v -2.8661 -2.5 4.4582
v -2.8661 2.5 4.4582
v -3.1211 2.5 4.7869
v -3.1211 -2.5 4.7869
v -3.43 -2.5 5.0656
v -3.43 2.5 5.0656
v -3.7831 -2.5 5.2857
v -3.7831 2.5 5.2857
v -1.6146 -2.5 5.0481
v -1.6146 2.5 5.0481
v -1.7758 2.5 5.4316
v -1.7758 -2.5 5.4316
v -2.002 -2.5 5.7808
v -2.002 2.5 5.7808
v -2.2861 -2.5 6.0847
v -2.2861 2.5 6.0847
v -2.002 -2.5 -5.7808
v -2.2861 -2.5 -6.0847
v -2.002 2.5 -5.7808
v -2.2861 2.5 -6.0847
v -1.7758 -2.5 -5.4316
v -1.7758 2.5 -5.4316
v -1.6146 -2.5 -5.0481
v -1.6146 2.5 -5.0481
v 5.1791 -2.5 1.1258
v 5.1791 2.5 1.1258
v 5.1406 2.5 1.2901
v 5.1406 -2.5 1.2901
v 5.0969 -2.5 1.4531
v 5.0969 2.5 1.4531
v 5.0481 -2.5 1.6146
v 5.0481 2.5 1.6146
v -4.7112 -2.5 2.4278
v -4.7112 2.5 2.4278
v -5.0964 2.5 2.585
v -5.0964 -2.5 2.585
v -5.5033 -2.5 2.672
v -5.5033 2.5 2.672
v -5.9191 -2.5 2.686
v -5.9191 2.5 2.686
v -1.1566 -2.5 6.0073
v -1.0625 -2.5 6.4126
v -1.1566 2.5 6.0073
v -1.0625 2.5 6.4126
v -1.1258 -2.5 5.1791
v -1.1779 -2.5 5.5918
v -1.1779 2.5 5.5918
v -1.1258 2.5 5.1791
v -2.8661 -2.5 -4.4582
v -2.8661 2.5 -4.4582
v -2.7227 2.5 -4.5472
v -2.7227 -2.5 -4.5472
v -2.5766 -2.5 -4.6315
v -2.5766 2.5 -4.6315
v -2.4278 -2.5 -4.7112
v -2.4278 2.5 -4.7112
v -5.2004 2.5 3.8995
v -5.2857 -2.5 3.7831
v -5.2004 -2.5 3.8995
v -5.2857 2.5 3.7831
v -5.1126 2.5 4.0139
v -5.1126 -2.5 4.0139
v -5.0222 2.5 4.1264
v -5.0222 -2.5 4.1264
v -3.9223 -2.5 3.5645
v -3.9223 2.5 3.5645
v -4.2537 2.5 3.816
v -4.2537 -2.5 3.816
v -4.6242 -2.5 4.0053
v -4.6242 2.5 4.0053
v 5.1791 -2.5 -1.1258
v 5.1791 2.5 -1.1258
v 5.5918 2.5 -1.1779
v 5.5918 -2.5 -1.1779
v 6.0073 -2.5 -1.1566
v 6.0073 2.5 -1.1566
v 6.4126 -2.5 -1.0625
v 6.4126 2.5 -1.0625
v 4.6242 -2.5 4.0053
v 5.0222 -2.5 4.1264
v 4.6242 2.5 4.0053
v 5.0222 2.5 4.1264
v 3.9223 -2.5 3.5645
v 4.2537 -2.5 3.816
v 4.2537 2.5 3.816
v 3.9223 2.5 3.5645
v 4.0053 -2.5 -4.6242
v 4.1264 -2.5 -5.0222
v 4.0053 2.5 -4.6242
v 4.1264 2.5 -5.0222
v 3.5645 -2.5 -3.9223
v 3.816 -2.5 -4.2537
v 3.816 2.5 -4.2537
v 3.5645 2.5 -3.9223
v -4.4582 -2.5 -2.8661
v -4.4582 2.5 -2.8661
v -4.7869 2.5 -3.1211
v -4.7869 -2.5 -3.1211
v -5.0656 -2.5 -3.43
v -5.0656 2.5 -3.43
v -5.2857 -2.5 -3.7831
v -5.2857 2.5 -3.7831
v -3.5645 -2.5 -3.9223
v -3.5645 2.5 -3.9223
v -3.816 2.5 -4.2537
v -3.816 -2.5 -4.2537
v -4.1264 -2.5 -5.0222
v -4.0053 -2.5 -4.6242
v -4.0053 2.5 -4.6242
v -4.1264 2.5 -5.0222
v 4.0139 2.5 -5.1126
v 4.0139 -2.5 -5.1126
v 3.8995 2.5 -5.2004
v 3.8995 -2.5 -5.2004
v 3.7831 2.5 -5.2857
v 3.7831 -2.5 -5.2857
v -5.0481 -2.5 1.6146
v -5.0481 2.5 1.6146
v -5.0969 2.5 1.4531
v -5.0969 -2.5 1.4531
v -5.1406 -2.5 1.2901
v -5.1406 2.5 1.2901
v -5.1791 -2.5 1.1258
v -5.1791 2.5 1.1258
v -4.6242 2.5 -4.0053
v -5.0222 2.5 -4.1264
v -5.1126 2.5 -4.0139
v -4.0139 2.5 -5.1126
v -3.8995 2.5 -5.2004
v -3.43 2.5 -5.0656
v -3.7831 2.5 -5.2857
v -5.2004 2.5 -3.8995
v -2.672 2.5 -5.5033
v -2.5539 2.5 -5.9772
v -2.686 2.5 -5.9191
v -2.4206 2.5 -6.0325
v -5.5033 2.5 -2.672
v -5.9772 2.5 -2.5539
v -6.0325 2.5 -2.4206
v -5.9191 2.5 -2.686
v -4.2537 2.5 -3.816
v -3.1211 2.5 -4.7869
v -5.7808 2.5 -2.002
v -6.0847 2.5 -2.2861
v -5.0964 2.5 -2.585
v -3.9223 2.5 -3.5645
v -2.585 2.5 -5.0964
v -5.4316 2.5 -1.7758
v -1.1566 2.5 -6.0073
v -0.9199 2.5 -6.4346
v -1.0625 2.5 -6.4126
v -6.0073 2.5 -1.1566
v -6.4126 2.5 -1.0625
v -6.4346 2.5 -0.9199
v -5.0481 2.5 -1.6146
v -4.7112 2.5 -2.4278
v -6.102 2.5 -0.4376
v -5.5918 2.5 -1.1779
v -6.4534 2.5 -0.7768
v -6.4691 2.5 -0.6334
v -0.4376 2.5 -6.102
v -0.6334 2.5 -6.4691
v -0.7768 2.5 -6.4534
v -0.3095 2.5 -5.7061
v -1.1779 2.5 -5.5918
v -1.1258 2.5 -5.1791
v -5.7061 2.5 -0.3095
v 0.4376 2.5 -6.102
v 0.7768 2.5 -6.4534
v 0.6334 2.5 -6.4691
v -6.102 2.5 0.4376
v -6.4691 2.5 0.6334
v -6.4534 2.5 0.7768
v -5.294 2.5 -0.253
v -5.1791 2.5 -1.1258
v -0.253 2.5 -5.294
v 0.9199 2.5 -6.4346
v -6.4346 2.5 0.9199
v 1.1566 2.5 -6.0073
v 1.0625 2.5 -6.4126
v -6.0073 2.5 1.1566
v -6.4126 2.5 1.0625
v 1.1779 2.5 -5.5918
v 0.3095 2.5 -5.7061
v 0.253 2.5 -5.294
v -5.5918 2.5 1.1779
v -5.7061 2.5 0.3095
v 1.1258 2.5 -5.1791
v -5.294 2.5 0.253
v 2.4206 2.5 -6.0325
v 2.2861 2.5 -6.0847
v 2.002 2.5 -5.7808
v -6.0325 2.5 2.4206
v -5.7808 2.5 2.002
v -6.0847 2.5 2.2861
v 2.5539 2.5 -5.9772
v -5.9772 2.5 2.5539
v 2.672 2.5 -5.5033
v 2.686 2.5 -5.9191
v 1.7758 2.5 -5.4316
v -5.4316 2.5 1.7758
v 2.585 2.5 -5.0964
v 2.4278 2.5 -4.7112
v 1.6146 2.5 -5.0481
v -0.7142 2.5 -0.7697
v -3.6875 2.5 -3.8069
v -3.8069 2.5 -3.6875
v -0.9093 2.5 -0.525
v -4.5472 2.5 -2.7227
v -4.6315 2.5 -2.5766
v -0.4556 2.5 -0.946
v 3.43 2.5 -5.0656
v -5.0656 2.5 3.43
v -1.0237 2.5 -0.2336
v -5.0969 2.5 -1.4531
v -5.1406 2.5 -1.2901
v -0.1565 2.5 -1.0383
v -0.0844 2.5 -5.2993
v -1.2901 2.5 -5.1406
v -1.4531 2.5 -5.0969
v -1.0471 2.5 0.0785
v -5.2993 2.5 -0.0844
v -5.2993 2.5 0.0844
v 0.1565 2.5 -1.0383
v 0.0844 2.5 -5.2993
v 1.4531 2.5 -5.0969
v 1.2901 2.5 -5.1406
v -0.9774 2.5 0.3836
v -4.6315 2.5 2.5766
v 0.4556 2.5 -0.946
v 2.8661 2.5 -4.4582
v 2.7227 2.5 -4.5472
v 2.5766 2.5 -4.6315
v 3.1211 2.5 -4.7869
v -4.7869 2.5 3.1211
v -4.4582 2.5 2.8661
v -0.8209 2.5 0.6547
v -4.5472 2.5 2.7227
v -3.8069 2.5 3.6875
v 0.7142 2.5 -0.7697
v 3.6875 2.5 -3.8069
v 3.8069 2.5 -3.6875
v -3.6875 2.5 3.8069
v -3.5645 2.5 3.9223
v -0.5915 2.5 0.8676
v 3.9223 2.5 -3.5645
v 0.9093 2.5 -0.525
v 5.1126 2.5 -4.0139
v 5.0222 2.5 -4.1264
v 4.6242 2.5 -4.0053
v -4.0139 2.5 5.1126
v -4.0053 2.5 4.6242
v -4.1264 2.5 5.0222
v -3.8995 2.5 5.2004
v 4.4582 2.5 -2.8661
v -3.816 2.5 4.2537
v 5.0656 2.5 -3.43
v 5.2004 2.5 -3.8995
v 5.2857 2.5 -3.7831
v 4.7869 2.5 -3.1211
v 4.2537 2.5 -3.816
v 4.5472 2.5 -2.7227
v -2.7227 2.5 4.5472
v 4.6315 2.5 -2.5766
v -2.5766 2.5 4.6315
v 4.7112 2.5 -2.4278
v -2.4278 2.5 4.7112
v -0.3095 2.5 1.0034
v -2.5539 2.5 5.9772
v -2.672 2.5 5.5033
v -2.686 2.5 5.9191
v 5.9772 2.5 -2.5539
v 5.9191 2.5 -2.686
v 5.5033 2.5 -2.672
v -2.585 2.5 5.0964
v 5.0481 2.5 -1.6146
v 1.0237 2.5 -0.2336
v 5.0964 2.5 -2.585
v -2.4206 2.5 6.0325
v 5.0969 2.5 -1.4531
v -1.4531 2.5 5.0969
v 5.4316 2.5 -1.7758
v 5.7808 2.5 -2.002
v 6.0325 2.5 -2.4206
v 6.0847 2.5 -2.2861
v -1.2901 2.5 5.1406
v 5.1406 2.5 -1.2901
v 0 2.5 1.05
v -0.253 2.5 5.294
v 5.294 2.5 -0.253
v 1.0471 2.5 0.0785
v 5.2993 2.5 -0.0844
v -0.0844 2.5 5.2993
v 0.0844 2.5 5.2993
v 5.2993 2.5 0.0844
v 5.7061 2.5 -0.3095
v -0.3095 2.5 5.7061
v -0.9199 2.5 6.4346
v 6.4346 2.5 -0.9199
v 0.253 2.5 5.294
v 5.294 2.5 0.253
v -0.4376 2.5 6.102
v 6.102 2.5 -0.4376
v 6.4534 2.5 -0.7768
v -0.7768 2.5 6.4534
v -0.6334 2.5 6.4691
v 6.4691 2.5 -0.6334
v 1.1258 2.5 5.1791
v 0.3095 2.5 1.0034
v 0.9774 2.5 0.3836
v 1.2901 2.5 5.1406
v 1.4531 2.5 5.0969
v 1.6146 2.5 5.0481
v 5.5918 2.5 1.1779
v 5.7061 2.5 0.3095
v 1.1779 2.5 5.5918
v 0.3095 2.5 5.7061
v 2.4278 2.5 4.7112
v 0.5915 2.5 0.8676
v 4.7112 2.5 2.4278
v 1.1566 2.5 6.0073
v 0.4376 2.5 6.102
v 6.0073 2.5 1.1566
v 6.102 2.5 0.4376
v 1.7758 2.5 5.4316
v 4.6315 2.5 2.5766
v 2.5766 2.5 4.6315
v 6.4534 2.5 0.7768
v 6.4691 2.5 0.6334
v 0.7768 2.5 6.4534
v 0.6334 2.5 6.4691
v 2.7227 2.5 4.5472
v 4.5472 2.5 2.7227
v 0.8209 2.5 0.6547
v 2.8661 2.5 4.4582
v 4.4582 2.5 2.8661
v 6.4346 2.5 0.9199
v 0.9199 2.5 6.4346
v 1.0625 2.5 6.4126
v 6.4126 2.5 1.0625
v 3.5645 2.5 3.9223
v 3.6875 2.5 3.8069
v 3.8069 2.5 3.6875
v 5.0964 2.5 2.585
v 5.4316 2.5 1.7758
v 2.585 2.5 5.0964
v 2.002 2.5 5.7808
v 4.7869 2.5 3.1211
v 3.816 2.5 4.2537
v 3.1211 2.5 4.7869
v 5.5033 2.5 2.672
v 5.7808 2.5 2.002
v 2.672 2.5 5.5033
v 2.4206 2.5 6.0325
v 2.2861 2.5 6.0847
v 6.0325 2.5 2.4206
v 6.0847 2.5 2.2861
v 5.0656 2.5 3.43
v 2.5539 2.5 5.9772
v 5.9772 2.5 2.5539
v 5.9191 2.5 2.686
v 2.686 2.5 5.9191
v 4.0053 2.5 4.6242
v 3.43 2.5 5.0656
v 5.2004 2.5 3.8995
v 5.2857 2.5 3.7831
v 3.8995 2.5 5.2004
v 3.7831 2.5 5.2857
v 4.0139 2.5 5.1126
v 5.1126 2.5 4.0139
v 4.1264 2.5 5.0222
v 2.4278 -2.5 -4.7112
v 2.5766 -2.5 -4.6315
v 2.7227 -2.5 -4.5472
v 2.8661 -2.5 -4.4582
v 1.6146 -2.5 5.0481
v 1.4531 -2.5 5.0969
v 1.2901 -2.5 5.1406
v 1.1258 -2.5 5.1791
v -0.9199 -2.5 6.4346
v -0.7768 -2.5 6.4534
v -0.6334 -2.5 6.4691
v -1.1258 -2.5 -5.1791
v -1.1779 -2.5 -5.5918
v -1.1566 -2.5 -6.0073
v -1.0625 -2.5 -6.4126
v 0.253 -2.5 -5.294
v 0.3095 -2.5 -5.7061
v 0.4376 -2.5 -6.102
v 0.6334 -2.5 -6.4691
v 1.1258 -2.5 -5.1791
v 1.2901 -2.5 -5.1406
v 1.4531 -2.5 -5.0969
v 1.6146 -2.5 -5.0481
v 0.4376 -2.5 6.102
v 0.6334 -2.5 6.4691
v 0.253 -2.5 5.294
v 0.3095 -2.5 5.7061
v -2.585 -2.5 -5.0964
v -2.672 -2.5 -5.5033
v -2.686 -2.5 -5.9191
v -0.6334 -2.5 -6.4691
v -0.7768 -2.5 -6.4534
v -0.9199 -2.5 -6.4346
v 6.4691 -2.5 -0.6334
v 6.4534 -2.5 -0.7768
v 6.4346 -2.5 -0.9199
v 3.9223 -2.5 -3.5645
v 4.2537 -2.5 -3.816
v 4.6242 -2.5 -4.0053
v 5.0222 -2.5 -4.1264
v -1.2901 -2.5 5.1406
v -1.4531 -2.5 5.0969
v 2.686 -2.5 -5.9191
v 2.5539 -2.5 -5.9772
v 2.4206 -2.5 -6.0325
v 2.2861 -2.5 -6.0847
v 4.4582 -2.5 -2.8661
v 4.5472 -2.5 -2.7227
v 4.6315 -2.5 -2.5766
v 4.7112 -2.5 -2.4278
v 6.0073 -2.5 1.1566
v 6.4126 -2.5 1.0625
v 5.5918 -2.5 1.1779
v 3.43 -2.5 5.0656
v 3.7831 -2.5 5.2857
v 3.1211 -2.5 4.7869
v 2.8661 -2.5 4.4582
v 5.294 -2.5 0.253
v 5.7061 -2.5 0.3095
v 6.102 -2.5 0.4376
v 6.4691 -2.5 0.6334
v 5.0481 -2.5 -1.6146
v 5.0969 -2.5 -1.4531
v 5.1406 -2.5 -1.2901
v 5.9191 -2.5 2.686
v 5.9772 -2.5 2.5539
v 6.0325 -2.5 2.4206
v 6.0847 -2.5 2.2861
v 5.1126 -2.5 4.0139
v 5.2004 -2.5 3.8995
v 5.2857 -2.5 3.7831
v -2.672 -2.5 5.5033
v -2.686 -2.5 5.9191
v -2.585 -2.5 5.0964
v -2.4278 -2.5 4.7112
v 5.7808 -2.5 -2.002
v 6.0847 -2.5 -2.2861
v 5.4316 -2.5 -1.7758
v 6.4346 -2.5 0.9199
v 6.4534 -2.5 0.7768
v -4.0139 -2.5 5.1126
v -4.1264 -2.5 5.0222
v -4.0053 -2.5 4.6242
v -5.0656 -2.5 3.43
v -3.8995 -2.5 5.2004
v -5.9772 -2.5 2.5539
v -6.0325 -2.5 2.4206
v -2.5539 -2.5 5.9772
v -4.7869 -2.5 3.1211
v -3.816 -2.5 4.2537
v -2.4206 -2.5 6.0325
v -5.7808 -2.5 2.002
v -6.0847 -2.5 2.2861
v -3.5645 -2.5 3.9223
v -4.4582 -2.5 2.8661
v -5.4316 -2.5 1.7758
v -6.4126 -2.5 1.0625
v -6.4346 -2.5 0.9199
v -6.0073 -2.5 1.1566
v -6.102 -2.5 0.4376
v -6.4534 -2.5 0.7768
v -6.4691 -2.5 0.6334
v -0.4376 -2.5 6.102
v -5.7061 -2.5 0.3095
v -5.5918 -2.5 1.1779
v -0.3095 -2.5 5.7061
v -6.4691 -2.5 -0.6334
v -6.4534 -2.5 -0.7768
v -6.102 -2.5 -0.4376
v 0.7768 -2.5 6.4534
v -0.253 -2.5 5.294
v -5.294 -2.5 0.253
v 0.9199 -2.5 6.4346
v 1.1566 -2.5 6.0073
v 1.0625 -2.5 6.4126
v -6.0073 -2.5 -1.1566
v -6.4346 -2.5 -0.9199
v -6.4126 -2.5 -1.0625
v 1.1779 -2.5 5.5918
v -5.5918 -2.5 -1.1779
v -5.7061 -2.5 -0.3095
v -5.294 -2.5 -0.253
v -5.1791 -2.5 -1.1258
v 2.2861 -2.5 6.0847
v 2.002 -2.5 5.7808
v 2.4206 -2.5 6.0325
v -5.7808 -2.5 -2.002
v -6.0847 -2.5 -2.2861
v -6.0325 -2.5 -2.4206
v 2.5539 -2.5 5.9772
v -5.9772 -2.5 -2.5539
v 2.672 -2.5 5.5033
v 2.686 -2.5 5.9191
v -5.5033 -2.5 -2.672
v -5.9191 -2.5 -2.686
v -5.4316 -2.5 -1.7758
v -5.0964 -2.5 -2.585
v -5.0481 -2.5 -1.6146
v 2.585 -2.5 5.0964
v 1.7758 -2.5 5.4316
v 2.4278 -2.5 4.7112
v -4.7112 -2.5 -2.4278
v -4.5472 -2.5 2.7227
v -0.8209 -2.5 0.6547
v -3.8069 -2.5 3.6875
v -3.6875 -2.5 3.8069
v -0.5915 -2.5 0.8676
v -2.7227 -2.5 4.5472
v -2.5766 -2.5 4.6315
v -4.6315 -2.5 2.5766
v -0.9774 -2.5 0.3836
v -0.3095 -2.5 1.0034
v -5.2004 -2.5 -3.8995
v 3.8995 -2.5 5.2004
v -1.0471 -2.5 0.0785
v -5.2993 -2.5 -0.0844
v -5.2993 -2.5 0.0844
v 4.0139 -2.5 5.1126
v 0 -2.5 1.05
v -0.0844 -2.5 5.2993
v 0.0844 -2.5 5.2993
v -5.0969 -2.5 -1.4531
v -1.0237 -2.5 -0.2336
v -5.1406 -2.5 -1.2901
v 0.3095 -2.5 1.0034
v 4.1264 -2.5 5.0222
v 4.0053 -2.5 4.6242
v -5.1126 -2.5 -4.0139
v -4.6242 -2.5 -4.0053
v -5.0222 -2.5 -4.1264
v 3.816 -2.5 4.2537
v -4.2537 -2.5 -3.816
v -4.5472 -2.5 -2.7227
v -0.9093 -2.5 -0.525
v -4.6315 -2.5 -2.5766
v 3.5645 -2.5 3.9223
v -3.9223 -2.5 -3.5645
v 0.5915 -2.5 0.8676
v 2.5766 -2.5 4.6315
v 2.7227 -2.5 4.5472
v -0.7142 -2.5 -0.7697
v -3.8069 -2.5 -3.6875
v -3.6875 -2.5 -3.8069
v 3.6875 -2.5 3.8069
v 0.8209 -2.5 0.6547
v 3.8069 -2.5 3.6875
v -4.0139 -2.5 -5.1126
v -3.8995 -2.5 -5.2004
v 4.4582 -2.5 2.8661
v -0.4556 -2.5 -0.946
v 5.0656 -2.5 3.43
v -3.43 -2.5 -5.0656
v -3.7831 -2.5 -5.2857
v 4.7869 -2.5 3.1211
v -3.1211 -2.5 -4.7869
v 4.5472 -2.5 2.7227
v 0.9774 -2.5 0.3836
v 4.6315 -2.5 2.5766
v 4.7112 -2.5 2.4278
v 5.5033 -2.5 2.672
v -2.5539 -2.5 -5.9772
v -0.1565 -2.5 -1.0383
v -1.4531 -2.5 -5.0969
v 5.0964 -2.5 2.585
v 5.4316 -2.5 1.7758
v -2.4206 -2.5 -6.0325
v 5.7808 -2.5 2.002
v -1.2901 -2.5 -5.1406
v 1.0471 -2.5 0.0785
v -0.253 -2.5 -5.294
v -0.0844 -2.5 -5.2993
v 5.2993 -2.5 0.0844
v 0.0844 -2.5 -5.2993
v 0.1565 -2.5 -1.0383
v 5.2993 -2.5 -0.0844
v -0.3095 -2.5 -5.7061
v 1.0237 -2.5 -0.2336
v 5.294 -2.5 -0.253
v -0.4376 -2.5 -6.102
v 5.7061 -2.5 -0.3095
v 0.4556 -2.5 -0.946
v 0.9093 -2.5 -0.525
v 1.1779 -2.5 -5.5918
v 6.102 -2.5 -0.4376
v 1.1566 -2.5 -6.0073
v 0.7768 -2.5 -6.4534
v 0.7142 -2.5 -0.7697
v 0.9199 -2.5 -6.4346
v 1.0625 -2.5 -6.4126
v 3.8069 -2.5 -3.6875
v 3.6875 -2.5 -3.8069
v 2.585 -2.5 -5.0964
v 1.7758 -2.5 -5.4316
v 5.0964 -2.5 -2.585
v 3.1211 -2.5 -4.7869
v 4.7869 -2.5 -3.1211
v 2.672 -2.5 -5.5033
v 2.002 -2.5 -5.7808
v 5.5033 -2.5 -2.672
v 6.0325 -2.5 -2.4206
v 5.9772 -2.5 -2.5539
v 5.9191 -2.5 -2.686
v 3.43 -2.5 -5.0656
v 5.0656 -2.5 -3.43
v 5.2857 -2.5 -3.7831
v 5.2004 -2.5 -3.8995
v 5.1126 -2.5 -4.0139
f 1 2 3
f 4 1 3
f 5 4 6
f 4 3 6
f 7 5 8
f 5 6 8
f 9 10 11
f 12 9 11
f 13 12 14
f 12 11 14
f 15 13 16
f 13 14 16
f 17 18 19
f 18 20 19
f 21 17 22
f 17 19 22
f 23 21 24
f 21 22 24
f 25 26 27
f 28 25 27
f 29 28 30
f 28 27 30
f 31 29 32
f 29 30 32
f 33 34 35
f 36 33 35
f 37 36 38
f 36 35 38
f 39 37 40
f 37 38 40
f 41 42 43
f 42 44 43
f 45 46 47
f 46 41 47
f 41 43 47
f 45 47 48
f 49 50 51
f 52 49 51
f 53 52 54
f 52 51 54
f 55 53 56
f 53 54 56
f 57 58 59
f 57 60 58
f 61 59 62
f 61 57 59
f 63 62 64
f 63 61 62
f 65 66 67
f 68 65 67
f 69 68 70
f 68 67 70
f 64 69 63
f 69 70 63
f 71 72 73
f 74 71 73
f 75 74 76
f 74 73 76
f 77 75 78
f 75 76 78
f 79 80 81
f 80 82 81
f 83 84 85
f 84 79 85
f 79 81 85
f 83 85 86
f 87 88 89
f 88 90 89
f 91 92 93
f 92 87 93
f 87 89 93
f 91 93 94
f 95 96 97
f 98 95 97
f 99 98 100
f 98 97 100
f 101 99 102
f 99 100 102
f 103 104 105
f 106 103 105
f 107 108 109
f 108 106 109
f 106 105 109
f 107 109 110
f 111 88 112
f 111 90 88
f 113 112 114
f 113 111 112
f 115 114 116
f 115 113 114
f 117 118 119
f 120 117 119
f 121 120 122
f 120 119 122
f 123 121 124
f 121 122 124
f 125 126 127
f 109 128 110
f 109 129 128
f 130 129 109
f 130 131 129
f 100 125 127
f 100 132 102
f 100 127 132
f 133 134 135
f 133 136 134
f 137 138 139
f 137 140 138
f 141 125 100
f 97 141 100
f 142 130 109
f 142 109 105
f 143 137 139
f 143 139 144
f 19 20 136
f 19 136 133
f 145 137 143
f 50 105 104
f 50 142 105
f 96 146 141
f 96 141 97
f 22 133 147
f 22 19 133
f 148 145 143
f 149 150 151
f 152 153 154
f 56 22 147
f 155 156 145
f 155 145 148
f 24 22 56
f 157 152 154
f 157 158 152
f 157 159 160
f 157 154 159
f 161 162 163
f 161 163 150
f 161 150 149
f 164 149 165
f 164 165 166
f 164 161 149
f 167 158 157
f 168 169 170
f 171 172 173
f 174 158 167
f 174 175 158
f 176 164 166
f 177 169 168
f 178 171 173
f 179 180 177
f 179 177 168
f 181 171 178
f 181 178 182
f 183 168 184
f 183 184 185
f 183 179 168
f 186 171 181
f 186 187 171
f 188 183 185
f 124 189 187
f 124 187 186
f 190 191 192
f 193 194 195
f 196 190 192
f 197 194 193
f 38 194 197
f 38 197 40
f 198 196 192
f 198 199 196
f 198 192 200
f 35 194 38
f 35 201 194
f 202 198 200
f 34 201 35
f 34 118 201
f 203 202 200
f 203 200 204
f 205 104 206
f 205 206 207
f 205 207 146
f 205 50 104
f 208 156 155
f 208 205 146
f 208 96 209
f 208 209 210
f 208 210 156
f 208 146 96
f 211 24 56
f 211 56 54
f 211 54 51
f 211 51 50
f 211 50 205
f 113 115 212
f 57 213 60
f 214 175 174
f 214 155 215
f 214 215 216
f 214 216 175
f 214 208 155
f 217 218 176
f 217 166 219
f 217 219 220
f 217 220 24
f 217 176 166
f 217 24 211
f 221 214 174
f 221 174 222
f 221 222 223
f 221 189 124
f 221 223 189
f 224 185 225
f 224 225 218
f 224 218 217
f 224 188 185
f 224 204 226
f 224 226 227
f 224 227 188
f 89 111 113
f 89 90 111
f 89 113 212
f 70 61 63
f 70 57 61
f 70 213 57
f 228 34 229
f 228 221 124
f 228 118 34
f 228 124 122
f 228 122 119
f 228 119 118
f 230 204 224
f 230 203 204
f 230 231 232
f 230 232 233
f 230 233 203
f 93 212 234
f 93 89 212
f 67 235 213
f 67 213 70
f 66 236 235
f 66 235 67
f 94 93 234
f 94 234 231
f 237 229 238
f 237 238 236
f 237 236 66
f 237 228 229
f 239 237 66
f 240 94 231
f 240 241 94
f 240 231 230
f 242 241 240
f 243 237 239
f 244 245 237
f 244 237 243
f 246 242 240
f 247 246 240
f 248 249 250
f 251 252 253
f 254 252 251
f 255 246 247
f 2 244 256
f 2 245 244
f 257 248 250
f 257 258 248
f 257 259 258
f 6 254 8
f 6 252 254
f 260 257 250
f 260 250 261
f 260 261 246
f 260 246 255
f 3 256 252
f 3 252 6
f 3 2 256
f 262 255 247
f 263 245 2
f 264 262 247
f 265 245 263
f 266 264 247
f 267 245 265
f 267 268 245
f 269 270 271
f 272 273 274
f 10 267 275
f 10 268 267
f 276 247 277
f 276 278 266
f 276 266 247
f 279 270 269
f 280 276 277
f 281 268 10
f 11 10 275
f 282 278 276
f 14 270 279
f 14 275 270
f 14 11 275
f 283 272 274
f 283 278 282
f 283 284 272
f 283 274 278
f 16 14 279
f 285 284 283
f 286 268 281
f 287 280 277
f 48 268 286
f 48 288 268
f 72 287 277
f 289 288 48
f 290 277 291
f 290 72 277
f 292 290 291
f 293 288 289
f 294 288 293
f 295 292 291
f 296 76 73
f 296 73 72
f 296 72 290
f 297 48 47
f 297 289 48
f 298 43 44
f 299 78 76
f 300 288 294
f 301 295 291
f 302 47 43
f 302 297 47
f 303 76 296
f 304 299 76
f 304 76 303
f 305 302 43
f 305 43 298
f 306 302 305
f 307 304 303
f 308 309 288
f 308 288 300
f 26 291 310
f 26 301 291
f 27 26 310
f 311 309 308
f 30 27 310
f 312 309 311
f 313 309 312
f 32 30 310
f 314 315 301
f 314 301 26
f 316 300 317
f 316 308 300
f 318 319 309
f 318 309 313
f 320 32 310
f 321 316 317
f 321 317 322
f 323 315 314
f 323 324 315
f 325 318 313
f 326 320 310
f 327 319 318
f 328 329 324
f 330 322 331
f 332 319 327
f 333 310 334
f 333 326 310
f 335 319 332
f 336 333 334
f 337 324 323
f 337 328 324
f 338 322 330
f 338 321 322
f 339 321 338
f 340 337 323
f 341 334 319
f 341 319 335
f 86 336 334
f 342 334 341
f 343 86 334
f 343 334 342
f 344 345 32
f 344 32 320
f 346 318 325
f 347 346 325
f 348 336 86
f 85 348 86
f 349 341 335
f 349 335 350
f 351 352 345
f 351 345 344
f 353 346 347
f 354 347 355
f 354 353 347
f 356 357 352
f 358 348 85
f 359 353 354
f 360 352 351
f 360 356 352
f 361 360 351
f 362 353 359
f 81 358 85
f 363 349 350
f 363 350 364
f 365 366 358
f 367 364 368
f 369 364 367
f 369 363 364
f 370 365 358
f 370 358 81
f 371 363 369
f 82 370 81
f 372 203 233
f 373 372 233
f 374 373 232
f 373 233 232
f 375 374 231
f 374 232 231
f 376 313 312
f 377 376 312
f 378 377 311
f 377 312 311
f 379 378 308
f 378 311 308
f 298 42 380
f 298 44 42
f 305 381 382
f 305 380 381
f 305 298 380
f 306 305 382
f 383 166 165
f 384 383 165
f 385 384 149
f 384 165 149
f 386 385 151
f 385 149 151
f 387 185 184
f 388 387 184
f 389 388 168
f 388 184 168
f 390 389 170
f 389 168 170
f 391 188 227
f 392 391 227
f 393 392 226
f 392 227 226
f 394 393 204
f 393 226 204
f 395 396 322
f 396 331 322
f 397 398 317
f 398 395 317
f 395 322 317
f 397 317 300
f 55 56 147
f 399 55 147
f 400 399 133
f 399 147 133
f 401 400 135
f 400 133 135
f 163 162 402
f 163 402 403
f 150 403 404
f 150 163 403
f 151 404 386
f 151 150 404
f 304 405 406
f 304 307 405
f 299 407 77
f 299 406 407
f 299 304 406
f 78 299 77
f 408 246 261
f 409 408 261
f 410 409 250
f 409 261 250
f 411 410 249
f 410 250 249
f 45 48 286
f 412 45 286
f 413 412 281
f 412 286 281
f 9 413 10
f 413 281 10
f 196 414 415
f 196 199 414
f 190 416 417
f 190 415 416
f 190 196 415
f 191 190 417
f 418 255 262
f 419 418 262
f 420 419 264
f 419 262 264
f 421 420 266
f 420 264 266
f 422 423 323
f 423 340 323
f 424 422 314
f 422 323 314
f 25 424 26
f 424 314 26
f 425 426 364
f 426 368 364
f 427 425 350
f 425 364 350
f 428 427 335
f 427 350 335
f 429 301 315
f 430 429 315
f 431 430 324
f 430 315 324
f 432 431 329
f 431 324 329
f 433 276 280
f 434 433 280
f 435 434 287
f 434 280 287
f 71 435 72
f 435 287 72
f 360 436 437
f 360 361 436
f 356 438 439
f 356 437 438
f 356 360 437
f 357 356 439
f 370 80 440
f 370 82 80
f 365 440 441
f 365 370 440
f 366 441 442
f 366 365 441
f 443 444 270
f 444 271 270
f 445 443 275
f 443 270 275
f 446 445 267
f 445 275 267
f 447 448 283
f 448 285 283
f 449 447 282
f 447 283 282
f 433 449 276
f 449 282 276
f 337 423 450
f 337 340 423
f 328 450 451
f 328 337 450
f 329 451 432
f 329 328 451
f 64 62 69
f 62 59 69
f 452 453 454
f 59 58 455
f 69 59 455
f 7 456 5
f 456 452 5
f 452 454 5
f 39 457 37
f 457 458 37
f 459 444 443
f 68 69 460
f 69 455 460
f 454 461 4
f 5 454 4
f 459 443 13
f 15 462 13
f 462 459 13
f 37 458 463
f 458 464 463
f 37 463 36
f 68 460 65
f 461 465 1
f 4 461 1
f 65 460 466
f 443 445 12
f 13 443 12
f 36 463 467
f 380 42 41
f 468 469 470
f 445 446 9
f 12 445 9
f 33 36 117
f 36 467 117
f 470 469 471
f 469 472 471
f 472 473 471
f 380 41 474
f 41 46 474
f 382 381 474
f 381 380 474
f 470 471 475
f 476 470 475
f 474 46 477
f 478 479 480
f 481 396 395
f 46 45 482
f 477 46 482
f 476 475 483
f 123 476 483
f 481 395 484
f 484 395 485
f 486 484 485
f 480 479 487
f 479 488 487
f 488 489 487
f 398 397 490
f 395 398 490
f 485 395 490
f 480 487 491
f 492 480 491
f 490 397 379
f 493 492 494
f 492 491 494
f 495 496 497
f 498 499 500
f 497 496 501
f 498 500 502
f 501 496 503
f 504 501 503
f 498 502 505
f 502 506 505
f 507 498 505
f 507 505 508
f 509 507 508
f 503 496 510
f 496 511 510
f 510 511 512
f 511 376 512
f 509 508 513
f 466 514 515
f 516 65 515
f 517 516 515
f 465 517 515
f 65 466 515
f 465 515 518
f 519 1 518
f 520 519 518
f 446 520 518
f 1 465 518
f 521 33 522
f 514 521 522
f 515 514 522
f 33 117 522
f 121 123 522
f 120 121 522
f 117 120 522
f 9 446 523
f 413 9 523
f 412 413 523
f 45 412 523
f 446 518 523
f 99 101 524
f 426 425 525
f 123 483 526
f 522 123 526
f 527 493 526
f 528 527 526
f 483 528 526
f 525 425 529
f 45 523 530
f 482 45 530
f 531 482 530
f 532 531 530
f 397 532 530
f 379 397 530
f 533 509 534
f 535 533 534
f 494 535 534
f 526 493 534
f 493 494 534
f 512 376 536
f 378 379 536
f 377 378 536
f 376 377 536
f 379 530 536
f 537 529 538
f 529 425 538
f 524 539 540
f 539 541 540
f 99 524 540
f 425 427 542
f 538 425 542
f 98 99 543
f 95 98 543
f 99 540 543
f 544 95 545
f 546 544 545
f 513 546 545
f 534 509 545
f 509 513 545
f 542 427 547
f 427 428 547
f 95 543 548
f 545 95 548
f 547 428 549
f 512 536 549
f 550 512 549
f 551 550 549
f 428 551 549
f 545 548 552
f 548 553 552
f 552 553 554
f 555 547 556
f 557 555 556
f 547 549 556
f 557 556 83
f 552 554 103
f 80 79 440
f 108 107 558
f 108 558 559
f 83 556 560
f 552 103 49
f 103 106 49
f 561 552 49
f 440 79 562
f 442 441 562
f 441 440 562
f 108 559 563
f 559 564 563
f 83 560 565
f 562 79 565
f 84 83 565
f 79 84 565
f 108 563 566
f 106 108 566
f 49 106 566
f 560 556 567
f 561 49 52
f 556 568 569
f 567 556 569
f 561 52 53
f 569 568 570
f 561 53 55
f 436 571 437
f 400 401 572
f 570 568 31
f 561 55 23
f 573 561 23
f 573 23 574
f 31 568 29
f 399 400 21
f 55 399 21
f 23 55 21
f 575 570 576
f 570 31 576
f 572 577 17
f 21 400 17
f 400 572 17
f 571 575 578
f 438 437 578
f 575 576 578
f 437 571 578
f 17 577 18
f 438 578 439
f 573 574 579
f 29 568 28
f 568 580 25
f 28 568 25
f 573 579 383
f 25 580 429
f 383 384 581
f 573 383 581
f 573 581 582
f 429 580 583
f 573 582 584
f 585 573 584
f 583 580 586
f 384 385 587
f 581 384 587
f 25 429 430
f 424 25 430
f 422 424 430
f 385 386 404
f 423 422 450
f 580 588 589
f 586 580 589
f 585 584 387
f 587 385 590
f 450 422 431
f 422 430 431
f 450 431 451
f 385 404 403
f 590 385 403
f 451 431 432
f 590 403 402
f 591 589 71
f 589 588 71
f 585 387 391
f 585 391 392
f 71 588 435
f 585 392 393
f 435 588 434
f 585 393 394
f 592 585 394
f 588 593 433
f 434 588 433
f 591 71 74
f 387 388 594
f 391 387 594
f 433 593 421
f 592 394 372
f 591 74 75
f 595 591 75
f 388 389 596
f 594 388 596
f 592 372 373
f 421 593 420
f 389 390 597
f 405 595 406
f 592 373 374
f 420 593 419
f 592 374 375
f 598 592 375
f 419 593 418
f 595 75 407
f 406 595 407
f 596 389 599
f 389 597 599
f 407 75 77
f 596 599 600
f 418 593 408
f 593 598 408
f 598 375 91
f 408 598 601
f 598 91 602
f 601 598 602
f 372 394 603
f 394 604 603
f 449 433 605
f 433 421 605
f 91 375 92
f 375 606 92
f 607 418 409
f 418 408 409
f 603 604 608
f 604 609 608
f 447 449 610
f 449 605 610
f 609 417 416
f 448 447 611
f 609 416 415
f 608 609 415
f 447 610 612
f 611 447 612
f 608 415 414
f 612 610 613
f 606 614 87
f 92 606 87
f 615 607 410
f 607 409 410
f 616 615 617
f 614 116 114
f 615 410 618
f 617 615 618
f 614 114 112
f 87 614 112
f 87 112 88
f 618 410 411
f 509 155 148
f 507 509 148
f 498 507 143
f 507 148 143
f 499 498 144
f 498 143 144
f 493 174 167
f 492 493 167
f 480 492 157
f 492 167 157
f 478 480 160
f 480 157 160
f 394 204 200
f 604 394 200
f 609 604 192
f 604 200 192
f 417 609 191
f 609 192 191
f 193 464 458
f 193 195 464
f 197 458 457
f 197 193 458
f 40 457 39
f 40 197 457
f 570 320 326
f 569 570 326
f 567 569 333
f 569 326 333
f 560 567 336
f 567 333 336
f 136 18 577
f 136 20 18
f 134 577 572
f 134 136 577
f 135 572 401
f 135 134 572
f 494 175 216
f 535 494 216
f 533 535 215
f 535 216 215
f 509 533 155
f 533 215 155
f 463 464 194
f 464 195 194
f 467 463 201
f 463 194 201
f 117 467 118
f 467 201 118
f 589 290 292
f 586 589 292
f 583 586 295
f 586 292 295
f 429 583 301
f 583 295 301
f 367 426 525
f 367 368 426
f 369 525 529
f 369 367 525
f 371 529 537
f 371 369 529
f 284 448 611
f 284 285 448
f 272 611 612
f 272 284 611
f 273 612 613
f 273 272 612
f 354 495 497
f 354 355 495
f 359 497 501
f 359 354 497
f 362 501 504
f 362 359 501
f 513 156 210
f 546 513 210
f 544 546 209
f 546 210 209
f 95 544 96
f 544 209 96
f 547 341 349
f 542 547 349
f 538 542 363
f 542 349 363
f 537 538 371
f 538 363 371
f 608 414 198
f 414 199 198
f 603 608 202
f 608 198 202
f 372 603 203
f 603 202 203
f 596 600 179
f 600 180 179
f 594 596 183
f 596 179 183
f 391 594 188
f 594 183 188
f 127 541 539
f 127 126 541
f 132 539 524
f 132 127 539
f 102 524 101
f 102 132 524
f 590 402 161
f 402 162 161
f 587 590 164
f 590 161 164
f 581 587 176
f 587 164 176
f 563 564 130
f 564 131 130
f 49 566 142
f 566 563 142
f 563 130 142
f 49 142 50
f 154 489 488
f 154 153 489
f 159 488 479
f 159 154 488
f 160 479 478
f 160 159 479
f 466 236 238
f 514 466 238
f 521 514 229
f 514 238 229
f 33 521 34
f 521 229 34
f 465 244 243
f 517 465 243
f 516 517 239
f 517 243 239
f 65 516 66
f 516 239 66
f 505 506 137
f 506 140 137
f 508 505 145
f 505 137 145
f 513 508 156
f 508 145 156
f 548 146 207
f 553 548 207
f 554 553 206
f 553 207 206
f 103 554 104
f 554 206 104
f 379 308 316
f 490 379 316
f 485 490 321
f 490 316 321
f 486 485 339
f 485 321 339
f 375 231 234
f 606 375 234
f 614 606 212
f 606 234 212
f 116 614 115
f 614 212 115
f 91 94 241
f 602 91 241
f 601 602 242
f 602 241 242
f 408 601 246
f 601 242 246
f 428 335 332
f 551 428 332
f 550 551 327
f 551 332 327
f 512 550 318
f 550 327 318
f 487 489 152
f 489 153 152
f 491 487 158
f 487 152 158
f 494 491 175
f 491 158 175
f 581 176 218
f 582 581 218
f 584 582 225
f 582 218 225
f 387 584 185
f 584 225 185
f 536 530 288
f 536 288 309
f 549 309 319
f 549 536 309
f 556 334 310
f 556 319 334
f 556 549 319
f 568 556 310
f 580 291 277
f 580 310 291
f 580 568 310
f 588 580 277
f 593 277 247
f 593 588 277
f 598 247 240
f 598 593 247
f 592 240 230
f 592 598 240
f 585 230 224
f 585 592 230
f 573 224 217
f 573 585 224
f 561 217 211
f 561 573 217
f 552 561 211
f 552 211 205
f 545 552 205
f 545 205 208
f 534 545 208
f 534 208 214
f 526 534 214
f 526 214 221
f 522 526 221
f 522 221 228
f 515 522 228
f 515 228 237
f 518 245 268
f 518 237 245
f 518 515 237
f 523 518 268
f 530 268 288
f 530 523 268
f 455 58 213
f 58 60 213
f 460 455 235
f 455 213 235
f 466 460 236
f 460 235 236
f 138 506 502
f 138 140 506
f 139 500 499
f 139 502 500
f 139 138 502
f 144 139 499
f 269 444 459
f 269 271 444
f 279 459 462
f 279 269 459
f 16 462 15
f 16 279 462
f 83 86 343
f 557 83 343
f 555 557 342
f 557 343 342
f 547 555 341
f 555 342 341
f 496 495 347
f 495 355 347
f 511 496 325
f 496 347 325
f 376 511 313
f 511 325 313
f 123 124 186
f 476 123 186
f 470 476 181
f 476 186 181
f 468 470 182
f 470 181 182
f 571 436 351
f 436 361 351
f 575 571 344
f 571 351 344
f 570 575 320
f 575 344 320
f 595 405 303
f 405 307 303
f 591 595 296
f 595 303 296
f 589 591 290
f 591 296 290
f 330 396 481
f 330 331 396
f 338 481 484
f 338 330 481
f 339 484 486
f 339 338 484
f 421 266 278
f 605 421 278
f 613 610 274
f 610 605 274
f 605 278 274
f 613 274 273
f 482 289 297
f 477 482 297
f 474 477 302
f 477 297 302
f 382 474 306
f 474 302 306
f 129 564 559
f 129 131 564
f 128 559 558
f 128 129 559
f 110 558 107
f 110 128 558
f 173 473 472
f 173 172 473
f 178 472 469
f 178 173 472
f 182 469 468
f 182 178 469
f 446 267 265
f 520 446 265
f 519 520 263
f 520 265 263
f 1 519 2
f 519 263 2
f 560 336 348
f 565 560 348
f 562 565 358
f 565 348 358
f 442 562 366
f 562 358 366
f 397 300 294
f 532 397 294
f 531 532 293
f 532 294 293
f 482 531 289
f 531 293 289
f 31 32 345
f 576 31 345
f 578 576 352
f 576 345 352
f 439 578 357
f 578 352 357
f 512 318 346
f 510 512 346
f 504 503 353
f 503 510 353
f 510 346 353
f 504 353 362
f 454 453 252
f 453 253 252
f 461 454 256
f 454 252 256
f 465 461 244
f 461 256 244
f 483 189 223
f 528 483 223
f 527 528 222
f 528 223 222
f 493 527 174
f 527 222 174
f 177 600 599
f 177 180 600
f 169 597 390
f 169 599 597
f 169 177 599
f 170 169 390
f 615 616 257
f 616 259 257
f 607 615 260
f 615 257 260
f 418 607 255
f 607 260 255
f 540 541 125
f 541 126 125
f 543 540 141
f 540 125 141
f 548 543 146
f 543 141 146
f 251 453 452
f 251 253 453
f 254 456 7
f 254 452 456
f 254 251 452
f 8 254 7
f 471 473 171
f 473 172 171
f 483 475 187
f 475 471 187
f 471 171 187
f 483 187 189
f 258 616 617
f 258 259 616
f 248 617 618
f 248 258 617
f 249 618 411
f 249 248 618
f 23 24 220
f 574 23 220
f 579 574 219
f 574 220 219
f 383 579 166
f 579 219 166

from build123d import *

# Parameters (mm, degrees)
SKETCH1_R               = 6.5
SKETCH1_R_2             = 6
SKETCH1_R_3             = 5.3
BOSS_EXTRUDE1_DEPTH     = 2.5
CUT_EXTRUDE1_DEPTH      = 10.526279442
CIRPATTERN1_COUNT       = 24
CUT_EXTRUDE2_DEPTH      = 10.48407185
CUT_EXTRUDE2_DEPTH_BACK = 10.48407185
SKETCH4_R               = 1.05


with BuildPart() as part:
    # Sketch1 → Boss-Extrude1 (new, symmetric)
    # profile 1 of 3: a face of its own
    with BuildSketch(Plane(origin=(0, 0, 0), x_dir=(1, 0, 0), z_dir=(0, 1, 0))):
        with Locations(Location((0, 0, 0), (0, 0, 270))):
            Circle(SKETCH1_R)
        Circle(SKETCH1_R_2, mode=Mode.SUBTRACT)
    # profile 2 of 3: a face of its own
    with BuildSketch(Plane(origin=(0, 0, 0), x_dir=(1, 0, 0), z_dir=(0, 1, 0))):
        Circle(SKETCH1_R_2)
        Circle(SKETCH1_R_3, mode=Mode.SUBTRACT)
    # profile 3 of 3: a face of its own
    with BuildSketch(Plane(origin=(0, 0, 0), x_dir=(1, 0, 0), z_dir=(0, 1, 0))):
        Circle(SKETCH1_R_3)
    extrude(amount=BOSS_EXTRUDE1_DEPTH, both=True)

    # Sketch3 → Cut-Extrude1 (cut, symmetric)
    with BuildSketch(Plane(origin=(0, 0, 0), x_dir=(1, 0, 0), z_dir=(0, 1, 0))):
        with BuildLine():
            ThreePointArc((-2.097447593, 7.48155155), (-0.805034356, 6.699886195), (-0.253044756, 5.293955832))
            ThreePointArc((-0.253044756, 5.293955832), (0, 5.3), (0.253044756, 5.293955832))
            ThreePointArc((0.253044756, 5.293955832), (0.805034356, 6.699886195), (2.097447593, 7.48155155))
            ThreePointArc((2.097447593, 7.48155155), (0, 7.77), (-2.097447593, 7.48155155))
        make_face()
    cut_extrude1 = extrude(amount=CUT_EXTRUDE1_DEPTH, both=True, mode=Mode.SUBTRACT)

    # CirPattern1: Cut-Extrude1 ×24 about axis
    cirpattern1_axis = Axis((0, 0, 0), (0, 1, 0))
    for i in range(1, CIRPATTERN1_COUNT):
        add(cut_extrude1.rotate(cirpattern1_axis, i * 360 / CIRPATTERN1_COUNT), mode=Mode.SUBTRACT)

    # Sketch4 → Cut-Extrude2 (cut, two sides: drawn at the far end of the back side and taken through both)
    with BuildSketch(Plane(origin=(0, 0, 0), x_dir=(1, 0, 0), z_dir=(0, 1, 0)).offset(-CUT_EXTRUDE2_DEPTH_BACK)):
        with Locations(Location((0, 0, 0), (0, 0, 270))):
            Circle(SKETCH4_R)
    extrude(amount=CUT_EXTRUDE2_DEPTH + CUT_EXTRUDE2_DEPTH_BACK, mode=Mode.SUBTRACT)


solid = part.part
